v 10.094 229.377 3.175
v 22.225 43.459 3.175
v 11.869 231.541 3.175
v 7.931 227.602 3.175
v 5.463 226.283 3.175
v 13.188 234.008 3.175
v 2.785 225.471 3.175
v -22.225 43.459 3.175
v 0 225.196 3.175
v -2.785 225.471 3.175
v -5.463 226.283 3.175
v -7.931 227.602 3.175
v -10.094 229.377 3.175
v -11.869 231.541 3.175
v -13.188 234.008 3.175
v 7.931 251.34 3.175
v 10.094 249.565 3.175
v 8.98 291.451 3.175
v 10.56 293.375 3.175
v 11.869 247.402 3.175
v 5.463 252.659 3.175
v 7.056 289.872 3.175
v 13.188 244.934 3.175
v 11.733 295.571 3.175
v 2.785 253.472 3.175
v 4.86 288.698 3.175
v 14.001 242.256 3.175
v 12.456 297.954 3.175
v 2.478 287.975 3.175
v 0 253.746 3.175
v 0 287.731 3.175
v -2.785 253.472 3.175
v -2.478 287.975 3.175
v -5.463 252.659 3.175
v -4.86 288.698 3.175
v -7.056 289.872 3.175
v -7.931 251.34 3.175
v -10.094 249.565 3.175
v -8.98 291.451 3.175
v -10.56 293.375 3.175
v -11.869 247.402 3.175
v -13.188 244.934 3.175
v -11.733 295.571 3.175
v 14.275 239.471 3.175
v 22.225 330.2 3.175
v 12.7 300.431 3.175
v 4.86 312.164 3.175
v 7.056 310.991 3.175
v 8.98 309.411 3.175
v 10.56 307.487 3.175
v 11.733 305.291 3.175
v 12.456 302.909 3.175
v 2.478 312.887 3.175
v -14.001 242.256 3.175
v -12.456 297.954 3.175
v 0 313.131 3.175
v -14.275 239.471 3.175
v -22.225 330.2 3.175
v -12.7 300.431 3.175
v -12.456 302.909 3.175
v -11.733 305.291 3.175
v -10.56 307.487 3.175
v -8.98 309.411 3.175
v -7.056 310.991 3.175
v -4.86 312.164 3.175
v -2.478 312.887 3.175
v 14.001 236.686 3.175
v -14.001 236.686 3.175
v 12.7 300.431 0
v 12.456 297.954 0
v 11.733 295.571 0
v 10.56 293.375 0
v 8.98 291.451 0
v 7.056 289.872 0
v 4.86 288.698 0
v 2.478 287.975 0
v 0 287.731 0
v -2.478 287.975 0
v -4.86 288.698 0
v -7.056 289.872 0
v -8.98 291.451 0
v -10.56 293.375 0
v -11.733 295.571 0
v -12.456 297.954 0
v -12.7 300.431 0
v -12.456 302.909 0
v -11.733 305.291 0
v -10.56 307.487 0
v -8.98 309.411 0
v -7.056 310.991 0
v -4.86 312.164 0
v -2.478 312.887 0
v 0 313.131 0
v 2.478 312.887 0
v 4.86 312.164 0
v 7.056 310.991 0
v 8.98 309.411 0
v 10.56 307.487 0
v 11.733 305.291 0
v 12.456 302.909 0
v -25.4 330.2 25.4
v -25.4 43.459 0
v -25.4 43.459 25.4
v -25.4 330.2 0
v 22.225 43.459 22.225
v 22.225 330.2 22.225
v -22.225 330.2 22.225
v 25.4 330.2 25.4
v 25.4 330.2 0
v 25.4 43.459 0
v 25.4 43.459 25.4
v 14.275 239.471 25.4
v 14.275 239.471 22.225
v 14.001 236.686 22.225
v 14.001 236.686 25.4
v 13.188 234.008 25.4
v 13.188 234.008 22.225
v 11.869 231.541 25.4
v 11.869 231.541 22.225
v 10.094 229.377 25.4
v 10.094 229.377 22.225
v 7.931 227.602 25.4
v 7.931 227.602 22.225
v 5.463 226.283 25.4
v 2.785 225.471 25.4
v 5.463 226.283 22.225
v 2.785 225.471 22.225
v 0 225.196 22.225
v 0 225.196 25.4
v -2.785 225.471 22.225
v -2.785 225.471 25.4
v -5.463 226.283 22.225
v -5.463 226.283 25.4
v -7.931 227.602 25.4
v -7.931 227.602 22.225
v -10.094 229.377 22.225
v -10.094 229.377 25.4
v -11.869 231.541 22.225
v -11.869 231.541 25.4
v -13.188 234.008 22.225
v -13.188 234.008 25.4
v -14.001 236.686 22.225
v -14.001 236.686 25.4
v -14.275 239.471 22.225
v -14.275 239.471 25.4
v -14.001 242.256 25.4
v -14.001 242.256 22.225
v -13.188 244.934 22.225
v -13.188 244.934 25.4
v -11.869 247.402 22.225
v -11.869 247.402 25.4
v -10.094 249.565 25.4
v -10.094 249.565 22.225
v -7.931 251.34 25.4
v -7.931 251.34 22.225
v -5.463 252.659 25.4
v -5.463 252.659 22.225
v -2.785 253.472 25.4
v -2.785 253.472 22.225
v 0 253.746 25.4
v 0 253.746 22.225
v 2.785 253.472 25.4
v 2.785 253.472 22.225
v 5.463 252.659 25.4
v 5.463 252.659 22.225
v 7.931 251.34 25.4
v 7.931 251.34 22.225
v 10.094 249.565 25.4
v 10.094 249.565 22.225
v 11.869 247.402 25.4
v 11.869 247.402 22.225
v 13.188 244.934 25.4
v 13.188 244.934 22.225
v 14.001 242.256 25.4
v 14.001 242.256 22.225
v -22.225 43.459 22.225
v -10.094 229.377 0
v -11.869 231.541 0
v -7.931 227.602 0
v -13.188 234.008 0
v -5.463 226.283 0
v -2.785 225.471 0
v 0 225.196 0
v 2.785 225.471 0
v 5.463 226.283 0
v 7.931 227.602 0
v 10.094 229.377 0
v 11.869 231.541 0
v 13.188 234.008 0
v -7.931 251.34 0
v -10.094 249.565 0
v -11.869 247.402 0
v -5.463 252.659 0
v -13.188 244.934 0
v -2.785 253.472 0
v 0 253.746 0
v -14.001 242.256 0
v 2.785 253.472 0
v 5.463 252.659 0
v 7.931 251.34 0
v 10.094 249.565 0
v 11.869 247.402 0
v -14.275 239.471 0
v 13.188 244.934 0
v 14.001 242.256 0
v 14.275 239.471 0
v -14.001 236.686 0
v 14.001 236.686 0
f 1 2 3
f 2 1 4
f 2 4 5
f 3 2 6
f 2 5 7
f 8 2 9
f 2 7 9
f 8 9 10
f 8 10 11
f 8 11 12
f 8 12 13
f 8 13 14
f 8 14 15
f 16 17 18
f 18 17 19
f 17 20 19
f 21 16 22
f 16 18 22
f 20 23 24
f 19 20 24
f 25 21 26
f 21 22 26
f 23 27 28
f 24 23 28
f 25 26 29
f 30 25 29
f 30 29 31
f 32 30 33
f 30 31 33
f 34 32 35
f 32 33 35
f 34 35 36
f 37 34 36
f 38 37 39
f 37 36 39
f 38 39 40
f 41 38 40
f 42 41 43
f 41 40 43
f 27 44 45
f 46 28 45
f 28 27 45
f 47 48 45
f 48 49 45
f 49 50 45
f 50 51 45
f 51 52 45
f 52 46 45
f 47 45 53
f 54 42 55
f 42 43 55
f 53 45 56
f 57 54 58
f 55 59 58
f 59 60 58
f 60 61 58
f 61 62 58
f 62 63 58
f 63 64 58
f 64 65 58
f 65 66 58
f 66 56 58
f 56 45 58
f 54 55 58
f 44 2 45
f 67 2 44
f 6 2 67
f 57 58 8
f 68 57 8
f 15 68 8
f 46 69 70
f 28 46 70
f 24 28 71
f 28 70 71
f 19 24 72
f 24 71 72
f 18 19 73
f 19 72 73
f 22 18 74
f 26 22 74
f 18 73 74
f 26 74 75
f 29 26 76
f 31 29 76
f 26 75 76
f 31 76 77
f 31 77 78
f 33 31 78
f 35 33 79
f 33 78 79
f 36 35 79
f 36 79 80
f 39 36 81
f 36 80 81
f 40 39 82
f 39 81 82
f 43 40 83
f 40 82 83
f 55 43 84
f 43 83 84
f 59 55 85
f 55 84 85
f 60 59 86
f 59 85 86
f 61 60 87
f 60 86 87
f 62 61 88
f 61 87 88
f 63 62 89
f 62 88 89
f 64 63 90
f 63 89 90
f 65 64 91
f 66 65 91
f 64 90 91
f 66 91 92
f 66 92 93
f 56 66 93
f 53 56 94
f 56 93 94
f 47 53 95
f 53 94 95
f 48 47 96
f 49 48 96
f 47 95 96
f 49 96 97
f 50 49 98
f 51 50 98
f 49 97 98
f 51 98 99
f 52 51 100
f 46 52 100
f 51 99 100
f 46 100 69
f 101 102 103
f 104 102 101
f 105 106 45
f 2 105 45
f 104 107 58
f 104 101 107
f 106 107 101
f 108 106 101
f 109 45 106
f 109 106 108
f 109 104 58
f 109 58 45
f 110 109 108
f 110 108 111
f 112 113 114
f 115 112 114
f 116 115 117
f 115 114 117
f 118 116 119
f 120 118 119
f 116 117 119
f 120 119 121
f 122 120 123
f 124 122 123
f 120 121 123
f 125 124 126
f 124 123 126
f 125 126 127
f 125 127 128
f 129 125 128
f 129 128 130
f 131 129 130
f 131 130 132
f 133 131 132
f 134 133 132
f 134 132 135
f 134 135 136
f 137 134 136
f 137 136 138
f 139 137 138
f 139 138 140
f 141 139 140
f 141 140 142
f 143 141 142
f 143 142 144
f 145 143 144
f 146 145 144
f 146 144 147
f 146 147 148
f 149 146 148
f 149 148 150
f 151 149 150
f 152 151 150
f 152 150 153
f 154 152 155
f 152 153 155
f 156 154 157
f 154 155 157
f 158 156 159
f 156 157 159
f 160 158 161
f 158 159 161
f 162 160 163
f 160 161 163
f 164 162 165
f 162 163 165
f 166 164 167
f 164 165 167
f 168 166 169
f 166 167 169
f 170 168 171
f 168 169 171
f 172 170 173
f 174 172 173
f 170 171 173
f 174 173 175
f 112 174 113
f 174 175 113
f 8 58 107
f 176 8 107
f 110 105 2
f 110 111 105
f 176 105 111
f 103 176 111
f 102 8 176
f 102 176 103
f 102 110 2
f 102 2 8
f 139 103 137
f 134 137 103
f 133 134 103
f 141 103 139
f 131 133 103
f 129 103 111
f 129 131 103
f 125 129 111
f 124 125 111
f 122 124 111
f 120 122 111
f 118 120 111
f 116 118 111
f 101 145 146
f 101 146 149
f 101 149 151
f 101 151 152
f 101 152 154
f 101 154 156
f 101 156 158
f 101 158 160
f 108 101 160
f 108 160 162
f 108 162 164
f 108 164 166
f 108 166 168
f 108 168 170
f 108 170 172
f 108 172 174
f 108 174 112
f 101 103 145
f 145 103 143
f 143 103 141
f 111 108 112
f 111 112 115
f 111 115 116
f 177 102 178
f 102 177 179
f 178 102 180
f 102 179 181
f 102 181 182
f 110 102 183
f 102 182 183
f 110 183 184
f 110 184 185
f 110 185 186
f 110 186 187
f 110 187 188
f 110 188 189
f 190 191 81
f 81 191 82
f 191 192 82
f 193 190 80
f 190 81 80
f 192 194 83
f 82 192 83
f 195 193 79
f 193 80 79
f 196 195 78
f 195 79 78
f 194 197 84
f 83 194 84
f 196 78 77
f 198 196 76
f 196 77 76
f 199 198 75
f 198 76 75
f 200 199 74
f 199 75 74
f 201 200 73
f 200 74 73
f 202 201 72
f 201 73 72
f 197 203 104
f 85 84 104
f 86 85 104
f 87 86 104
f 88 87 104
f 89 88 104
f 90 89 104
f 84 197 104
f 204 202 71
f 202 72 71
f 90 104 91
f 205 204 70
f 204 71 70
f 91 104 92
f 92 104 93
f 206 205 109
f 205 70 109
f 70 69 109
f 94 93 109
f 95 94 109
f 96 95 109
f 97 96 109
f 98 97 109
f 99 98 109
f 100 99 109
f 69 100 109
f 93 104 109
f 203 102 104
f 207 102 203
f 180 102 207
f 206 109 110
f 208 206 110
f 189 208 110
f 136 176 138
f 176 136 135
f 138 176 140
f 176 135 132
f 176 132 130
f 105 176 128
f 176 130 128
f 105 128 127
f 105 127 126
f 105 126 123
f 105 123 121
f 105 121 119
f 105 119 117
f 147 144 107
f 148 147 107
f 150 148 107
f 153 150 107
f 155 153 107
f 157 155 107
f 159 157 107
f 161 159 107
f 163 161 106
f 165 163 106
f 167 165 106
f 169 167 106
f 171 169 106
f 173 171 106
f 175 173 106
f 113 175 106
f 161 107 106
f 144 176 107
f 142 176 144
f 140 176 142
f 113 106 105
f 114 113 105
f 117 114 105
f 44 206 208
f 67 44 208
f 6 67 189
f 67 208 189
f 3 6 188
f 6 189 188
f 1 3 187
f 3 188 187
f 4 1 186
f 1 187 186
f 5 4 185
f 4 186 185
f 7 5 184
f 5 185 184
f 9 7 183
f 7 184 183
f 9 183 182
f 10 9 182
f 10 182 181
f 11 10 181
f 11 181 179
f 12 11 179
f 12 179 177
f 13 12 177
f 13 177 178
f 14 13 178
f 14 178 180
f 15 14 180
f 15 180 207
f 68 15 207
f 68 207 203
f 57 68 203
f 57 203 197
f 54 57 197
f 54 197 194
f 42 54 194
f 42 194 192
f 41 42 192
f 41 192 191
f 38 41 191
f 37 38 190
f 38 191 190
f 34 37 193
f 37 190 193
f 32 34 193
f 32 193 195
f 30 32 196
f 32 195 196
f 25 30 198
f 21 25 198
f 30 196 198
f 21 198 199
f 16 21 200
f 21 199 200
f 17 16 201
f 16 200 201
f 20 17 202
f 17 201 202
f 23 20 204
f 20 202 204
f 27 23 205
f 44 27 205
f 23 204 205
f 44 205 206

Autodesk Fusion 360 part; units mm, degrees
sketch "Sketch1" plane through (0, 0, 0) normal (0, 0, 1) x (1, 0, 0)
  line L0 (0, 0) -> (0, 300.4312) construction
  circle A0 centre (0, 300.4312) radius 12.7
  line L1 (25.4, 0) -> (-25.4, 0)
  line L2 (-25.4, 0) -> (-25.4, 330.2)
  line L3 (-25.4, 330.2) -> (25.4, 330.2)
  line L4 (25.4, 330.2) -> (25.4, 0)
  dimension "d1" = 300.4312
  dimension "d2" = 25.4
  dimension "d3" = 50.8
  dimension "d4" = 330.2
extrude "Extrude1" add sketch "Sketch1" along normal blind 25.4 contours A0 | L1 L2 L3 L4
sketch "Sketch2" plane through (0, 330.2, 0) normal (0, 1, 0) x (-1, 0, 0)
  line L0 (-25.4, 0) -> (25.4, 0)
  line L1 (25.4, 0) -> (25.4, 25.4)
  line L2 (25.4, 25.4) -> (-25.4, 25.4)
  line L3 (-25.4, 25.4) -> (-25.4, 0)
  line L4 (-22.225, 22.225) -> (-22.225, 3.175)
  line L5 (-22.225, 3.175) -> (22.225, 3.175)
  line L6 (22.225, 3.175) -> (22.225, 22.225)
  line L7 (22.225, 22.225) -> (-22.225, 22.225)
  dimension "d7" = -3.175
extrude "Extrude2" cut sketch "Sketch2" against normal up to surface (330.2 mm away) contours L4 L5 L6 L7
extrude "Extrude3" cut sketch "Sketch1" along normal blind 3.175 contours A0
move_face "OffsetFaces1" offset -43.4594 1 faces at (7.4083, 0, 1.0583)
sketch "Sketch3" plane through (0, 0, 0) normal (0, 0, 1) x (1, 0, 0)
  line L0 (-12.7, 300.4312) -> (-6.35, 289.4327) construction
  line L1 (-6.35, 289.4327) -> (6.35, 289.4327) construction
  line L2 (6.35, 289.4327) -> (12.7, 300.4312) construction
  line L3 (12.7, 300.4312) -> (6.35, 311.4297) construction
  line L4 (6.35, 311.4297) -> (-6.35, 311.4297) construction
  line L5 (-6.35, 311.4297) -> (-12.7, 300.4312) construction
  circle A0 centre (0, 300.4312) radius 30.48 construction
  circle A1 centre (0, 239.4712) radius 30.48 construction
  circle A2 centre (0, 239.4712) radius 14.2748
  point P0 (0, 300.4312)
  dimension "d19" = 12.7
  dimension "d20" = 60.96
  dimension "d21" = 60.96
  dimension "d22" = 28.5496
extrude "Extrude5" cut sketch "Sketch3" along normal blind 50.8
component "Intake Support" placed x (1, 0, 0) y (0, 1, 0) z (0, 0, 1) at (0, 0, 0)
equation "d12 = -3 in + 1.289 in"
